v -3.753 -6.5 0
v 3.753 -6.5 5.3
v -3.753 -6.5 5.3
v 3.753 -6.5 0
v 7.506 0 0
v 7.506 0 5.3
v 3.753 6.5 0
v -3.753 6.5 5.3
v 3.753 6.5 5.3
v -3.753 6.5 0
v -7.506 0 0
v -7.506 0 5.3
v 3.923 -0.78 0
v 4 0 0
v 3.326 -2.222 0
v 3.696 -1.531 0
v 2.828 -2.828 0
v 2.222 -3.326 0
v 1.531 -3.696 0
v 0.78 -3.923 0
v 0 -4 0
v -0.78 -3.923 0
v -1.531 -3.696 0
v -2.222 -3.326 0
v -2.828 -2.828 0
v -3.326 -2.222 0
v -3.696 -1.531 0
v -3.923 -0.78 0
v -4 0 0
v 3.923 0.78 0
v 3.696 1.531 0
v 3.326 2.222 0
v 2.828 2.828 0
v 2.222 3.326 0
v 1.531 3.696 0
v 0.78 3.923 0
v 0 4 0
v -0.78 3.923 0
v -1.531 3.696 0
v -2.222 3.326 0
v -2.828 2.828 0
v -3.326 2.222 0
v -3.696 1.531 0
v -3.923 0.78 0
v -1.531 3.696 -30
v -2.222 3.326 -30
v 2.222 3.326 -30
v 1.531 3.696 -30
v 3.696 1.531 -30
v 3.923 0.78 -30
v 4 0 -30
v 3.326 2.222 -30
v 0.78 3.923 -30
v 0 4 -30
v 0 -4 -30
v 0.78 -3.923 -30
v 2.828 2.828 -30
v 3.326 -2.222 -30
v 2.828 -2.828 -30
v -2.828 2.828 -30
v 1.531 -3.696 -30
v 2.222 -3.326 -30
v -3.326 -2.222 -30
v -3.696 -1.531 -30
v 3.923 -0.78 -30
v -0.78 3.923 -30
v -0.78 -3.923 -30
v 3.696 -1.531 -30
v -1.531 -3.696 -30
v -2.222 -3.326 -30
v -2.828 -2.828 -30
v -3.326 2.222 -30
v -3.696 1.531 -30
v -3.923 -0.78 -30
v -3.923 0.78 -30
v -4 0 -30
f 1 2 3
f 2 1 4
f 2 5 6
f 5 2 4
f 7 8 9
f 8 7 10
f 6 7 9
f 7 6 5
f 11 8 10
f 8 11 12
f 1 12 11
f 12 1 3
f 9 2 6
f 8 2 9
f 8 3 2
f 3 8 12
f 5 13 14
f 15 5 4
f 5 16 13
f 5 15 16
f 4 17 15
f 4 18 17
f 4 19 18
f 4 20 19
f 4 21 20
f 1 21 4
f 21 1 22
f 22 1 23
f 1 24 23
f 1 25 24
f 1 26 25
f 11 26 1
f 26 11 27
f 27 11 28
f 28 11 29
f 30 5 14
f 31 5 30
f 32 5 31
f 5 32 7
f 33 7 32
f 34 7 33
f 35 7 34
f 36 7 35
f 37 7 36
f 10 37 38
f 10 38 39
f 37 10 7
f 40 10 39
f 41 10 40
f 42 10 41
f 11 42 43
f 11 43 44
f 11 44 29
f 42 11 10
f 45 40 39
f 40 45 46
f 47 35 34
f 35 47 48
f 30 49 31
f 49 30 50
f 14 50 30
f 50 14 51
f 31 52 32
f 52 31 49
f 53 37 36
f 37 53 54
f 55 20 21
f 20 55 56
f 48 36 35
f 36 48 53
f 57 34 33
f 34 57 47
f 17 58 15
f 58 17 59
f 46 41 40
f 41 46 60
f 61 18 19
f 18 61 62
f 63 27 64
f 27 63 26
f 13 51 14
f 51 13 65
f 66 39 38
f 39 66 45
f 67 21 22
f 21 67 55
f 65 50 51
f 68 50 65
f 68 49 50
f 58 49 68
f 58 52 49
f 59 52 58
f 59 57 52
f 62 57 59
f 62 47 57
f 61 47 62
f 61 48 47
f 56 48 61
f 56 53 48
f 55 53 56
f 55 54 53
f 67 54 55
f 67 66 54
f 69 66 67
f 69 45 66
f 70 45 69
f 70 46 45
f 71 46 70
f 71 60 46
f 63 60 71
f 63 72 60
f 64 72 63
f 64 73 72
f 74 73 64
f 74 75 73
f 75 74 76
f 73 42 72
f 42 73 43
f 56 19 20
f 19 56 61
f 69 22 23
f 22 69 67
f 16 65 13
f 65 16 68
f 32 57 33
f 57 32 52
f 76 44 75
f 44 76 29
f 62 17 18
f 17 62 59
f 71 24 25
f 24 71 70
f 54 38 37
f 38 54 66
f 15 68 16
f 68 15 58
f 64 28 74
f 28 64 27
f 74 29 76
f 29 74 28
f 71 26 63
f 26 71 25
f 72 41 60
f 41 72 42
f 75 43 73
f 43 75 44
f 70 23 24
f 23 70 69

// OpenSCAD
// M8六角ボルト
// 頭部：六角柱（対辺距離13mm、高さ5.3mm）
// シャンク：円柱（直径8mm、長さ30mm）

module hex_bolt_m8() {
    // 六角頭部
    translate([0, 0, 0]) {
        cylinder(d=13/cos(30), h=5.3, $fn=6);
    }
    
    // シャンク部
    translate([0, 0, -30]) {
        cylinder(d=8, h=30, $fn=32);
    }
}

hex_bolt_m8();
